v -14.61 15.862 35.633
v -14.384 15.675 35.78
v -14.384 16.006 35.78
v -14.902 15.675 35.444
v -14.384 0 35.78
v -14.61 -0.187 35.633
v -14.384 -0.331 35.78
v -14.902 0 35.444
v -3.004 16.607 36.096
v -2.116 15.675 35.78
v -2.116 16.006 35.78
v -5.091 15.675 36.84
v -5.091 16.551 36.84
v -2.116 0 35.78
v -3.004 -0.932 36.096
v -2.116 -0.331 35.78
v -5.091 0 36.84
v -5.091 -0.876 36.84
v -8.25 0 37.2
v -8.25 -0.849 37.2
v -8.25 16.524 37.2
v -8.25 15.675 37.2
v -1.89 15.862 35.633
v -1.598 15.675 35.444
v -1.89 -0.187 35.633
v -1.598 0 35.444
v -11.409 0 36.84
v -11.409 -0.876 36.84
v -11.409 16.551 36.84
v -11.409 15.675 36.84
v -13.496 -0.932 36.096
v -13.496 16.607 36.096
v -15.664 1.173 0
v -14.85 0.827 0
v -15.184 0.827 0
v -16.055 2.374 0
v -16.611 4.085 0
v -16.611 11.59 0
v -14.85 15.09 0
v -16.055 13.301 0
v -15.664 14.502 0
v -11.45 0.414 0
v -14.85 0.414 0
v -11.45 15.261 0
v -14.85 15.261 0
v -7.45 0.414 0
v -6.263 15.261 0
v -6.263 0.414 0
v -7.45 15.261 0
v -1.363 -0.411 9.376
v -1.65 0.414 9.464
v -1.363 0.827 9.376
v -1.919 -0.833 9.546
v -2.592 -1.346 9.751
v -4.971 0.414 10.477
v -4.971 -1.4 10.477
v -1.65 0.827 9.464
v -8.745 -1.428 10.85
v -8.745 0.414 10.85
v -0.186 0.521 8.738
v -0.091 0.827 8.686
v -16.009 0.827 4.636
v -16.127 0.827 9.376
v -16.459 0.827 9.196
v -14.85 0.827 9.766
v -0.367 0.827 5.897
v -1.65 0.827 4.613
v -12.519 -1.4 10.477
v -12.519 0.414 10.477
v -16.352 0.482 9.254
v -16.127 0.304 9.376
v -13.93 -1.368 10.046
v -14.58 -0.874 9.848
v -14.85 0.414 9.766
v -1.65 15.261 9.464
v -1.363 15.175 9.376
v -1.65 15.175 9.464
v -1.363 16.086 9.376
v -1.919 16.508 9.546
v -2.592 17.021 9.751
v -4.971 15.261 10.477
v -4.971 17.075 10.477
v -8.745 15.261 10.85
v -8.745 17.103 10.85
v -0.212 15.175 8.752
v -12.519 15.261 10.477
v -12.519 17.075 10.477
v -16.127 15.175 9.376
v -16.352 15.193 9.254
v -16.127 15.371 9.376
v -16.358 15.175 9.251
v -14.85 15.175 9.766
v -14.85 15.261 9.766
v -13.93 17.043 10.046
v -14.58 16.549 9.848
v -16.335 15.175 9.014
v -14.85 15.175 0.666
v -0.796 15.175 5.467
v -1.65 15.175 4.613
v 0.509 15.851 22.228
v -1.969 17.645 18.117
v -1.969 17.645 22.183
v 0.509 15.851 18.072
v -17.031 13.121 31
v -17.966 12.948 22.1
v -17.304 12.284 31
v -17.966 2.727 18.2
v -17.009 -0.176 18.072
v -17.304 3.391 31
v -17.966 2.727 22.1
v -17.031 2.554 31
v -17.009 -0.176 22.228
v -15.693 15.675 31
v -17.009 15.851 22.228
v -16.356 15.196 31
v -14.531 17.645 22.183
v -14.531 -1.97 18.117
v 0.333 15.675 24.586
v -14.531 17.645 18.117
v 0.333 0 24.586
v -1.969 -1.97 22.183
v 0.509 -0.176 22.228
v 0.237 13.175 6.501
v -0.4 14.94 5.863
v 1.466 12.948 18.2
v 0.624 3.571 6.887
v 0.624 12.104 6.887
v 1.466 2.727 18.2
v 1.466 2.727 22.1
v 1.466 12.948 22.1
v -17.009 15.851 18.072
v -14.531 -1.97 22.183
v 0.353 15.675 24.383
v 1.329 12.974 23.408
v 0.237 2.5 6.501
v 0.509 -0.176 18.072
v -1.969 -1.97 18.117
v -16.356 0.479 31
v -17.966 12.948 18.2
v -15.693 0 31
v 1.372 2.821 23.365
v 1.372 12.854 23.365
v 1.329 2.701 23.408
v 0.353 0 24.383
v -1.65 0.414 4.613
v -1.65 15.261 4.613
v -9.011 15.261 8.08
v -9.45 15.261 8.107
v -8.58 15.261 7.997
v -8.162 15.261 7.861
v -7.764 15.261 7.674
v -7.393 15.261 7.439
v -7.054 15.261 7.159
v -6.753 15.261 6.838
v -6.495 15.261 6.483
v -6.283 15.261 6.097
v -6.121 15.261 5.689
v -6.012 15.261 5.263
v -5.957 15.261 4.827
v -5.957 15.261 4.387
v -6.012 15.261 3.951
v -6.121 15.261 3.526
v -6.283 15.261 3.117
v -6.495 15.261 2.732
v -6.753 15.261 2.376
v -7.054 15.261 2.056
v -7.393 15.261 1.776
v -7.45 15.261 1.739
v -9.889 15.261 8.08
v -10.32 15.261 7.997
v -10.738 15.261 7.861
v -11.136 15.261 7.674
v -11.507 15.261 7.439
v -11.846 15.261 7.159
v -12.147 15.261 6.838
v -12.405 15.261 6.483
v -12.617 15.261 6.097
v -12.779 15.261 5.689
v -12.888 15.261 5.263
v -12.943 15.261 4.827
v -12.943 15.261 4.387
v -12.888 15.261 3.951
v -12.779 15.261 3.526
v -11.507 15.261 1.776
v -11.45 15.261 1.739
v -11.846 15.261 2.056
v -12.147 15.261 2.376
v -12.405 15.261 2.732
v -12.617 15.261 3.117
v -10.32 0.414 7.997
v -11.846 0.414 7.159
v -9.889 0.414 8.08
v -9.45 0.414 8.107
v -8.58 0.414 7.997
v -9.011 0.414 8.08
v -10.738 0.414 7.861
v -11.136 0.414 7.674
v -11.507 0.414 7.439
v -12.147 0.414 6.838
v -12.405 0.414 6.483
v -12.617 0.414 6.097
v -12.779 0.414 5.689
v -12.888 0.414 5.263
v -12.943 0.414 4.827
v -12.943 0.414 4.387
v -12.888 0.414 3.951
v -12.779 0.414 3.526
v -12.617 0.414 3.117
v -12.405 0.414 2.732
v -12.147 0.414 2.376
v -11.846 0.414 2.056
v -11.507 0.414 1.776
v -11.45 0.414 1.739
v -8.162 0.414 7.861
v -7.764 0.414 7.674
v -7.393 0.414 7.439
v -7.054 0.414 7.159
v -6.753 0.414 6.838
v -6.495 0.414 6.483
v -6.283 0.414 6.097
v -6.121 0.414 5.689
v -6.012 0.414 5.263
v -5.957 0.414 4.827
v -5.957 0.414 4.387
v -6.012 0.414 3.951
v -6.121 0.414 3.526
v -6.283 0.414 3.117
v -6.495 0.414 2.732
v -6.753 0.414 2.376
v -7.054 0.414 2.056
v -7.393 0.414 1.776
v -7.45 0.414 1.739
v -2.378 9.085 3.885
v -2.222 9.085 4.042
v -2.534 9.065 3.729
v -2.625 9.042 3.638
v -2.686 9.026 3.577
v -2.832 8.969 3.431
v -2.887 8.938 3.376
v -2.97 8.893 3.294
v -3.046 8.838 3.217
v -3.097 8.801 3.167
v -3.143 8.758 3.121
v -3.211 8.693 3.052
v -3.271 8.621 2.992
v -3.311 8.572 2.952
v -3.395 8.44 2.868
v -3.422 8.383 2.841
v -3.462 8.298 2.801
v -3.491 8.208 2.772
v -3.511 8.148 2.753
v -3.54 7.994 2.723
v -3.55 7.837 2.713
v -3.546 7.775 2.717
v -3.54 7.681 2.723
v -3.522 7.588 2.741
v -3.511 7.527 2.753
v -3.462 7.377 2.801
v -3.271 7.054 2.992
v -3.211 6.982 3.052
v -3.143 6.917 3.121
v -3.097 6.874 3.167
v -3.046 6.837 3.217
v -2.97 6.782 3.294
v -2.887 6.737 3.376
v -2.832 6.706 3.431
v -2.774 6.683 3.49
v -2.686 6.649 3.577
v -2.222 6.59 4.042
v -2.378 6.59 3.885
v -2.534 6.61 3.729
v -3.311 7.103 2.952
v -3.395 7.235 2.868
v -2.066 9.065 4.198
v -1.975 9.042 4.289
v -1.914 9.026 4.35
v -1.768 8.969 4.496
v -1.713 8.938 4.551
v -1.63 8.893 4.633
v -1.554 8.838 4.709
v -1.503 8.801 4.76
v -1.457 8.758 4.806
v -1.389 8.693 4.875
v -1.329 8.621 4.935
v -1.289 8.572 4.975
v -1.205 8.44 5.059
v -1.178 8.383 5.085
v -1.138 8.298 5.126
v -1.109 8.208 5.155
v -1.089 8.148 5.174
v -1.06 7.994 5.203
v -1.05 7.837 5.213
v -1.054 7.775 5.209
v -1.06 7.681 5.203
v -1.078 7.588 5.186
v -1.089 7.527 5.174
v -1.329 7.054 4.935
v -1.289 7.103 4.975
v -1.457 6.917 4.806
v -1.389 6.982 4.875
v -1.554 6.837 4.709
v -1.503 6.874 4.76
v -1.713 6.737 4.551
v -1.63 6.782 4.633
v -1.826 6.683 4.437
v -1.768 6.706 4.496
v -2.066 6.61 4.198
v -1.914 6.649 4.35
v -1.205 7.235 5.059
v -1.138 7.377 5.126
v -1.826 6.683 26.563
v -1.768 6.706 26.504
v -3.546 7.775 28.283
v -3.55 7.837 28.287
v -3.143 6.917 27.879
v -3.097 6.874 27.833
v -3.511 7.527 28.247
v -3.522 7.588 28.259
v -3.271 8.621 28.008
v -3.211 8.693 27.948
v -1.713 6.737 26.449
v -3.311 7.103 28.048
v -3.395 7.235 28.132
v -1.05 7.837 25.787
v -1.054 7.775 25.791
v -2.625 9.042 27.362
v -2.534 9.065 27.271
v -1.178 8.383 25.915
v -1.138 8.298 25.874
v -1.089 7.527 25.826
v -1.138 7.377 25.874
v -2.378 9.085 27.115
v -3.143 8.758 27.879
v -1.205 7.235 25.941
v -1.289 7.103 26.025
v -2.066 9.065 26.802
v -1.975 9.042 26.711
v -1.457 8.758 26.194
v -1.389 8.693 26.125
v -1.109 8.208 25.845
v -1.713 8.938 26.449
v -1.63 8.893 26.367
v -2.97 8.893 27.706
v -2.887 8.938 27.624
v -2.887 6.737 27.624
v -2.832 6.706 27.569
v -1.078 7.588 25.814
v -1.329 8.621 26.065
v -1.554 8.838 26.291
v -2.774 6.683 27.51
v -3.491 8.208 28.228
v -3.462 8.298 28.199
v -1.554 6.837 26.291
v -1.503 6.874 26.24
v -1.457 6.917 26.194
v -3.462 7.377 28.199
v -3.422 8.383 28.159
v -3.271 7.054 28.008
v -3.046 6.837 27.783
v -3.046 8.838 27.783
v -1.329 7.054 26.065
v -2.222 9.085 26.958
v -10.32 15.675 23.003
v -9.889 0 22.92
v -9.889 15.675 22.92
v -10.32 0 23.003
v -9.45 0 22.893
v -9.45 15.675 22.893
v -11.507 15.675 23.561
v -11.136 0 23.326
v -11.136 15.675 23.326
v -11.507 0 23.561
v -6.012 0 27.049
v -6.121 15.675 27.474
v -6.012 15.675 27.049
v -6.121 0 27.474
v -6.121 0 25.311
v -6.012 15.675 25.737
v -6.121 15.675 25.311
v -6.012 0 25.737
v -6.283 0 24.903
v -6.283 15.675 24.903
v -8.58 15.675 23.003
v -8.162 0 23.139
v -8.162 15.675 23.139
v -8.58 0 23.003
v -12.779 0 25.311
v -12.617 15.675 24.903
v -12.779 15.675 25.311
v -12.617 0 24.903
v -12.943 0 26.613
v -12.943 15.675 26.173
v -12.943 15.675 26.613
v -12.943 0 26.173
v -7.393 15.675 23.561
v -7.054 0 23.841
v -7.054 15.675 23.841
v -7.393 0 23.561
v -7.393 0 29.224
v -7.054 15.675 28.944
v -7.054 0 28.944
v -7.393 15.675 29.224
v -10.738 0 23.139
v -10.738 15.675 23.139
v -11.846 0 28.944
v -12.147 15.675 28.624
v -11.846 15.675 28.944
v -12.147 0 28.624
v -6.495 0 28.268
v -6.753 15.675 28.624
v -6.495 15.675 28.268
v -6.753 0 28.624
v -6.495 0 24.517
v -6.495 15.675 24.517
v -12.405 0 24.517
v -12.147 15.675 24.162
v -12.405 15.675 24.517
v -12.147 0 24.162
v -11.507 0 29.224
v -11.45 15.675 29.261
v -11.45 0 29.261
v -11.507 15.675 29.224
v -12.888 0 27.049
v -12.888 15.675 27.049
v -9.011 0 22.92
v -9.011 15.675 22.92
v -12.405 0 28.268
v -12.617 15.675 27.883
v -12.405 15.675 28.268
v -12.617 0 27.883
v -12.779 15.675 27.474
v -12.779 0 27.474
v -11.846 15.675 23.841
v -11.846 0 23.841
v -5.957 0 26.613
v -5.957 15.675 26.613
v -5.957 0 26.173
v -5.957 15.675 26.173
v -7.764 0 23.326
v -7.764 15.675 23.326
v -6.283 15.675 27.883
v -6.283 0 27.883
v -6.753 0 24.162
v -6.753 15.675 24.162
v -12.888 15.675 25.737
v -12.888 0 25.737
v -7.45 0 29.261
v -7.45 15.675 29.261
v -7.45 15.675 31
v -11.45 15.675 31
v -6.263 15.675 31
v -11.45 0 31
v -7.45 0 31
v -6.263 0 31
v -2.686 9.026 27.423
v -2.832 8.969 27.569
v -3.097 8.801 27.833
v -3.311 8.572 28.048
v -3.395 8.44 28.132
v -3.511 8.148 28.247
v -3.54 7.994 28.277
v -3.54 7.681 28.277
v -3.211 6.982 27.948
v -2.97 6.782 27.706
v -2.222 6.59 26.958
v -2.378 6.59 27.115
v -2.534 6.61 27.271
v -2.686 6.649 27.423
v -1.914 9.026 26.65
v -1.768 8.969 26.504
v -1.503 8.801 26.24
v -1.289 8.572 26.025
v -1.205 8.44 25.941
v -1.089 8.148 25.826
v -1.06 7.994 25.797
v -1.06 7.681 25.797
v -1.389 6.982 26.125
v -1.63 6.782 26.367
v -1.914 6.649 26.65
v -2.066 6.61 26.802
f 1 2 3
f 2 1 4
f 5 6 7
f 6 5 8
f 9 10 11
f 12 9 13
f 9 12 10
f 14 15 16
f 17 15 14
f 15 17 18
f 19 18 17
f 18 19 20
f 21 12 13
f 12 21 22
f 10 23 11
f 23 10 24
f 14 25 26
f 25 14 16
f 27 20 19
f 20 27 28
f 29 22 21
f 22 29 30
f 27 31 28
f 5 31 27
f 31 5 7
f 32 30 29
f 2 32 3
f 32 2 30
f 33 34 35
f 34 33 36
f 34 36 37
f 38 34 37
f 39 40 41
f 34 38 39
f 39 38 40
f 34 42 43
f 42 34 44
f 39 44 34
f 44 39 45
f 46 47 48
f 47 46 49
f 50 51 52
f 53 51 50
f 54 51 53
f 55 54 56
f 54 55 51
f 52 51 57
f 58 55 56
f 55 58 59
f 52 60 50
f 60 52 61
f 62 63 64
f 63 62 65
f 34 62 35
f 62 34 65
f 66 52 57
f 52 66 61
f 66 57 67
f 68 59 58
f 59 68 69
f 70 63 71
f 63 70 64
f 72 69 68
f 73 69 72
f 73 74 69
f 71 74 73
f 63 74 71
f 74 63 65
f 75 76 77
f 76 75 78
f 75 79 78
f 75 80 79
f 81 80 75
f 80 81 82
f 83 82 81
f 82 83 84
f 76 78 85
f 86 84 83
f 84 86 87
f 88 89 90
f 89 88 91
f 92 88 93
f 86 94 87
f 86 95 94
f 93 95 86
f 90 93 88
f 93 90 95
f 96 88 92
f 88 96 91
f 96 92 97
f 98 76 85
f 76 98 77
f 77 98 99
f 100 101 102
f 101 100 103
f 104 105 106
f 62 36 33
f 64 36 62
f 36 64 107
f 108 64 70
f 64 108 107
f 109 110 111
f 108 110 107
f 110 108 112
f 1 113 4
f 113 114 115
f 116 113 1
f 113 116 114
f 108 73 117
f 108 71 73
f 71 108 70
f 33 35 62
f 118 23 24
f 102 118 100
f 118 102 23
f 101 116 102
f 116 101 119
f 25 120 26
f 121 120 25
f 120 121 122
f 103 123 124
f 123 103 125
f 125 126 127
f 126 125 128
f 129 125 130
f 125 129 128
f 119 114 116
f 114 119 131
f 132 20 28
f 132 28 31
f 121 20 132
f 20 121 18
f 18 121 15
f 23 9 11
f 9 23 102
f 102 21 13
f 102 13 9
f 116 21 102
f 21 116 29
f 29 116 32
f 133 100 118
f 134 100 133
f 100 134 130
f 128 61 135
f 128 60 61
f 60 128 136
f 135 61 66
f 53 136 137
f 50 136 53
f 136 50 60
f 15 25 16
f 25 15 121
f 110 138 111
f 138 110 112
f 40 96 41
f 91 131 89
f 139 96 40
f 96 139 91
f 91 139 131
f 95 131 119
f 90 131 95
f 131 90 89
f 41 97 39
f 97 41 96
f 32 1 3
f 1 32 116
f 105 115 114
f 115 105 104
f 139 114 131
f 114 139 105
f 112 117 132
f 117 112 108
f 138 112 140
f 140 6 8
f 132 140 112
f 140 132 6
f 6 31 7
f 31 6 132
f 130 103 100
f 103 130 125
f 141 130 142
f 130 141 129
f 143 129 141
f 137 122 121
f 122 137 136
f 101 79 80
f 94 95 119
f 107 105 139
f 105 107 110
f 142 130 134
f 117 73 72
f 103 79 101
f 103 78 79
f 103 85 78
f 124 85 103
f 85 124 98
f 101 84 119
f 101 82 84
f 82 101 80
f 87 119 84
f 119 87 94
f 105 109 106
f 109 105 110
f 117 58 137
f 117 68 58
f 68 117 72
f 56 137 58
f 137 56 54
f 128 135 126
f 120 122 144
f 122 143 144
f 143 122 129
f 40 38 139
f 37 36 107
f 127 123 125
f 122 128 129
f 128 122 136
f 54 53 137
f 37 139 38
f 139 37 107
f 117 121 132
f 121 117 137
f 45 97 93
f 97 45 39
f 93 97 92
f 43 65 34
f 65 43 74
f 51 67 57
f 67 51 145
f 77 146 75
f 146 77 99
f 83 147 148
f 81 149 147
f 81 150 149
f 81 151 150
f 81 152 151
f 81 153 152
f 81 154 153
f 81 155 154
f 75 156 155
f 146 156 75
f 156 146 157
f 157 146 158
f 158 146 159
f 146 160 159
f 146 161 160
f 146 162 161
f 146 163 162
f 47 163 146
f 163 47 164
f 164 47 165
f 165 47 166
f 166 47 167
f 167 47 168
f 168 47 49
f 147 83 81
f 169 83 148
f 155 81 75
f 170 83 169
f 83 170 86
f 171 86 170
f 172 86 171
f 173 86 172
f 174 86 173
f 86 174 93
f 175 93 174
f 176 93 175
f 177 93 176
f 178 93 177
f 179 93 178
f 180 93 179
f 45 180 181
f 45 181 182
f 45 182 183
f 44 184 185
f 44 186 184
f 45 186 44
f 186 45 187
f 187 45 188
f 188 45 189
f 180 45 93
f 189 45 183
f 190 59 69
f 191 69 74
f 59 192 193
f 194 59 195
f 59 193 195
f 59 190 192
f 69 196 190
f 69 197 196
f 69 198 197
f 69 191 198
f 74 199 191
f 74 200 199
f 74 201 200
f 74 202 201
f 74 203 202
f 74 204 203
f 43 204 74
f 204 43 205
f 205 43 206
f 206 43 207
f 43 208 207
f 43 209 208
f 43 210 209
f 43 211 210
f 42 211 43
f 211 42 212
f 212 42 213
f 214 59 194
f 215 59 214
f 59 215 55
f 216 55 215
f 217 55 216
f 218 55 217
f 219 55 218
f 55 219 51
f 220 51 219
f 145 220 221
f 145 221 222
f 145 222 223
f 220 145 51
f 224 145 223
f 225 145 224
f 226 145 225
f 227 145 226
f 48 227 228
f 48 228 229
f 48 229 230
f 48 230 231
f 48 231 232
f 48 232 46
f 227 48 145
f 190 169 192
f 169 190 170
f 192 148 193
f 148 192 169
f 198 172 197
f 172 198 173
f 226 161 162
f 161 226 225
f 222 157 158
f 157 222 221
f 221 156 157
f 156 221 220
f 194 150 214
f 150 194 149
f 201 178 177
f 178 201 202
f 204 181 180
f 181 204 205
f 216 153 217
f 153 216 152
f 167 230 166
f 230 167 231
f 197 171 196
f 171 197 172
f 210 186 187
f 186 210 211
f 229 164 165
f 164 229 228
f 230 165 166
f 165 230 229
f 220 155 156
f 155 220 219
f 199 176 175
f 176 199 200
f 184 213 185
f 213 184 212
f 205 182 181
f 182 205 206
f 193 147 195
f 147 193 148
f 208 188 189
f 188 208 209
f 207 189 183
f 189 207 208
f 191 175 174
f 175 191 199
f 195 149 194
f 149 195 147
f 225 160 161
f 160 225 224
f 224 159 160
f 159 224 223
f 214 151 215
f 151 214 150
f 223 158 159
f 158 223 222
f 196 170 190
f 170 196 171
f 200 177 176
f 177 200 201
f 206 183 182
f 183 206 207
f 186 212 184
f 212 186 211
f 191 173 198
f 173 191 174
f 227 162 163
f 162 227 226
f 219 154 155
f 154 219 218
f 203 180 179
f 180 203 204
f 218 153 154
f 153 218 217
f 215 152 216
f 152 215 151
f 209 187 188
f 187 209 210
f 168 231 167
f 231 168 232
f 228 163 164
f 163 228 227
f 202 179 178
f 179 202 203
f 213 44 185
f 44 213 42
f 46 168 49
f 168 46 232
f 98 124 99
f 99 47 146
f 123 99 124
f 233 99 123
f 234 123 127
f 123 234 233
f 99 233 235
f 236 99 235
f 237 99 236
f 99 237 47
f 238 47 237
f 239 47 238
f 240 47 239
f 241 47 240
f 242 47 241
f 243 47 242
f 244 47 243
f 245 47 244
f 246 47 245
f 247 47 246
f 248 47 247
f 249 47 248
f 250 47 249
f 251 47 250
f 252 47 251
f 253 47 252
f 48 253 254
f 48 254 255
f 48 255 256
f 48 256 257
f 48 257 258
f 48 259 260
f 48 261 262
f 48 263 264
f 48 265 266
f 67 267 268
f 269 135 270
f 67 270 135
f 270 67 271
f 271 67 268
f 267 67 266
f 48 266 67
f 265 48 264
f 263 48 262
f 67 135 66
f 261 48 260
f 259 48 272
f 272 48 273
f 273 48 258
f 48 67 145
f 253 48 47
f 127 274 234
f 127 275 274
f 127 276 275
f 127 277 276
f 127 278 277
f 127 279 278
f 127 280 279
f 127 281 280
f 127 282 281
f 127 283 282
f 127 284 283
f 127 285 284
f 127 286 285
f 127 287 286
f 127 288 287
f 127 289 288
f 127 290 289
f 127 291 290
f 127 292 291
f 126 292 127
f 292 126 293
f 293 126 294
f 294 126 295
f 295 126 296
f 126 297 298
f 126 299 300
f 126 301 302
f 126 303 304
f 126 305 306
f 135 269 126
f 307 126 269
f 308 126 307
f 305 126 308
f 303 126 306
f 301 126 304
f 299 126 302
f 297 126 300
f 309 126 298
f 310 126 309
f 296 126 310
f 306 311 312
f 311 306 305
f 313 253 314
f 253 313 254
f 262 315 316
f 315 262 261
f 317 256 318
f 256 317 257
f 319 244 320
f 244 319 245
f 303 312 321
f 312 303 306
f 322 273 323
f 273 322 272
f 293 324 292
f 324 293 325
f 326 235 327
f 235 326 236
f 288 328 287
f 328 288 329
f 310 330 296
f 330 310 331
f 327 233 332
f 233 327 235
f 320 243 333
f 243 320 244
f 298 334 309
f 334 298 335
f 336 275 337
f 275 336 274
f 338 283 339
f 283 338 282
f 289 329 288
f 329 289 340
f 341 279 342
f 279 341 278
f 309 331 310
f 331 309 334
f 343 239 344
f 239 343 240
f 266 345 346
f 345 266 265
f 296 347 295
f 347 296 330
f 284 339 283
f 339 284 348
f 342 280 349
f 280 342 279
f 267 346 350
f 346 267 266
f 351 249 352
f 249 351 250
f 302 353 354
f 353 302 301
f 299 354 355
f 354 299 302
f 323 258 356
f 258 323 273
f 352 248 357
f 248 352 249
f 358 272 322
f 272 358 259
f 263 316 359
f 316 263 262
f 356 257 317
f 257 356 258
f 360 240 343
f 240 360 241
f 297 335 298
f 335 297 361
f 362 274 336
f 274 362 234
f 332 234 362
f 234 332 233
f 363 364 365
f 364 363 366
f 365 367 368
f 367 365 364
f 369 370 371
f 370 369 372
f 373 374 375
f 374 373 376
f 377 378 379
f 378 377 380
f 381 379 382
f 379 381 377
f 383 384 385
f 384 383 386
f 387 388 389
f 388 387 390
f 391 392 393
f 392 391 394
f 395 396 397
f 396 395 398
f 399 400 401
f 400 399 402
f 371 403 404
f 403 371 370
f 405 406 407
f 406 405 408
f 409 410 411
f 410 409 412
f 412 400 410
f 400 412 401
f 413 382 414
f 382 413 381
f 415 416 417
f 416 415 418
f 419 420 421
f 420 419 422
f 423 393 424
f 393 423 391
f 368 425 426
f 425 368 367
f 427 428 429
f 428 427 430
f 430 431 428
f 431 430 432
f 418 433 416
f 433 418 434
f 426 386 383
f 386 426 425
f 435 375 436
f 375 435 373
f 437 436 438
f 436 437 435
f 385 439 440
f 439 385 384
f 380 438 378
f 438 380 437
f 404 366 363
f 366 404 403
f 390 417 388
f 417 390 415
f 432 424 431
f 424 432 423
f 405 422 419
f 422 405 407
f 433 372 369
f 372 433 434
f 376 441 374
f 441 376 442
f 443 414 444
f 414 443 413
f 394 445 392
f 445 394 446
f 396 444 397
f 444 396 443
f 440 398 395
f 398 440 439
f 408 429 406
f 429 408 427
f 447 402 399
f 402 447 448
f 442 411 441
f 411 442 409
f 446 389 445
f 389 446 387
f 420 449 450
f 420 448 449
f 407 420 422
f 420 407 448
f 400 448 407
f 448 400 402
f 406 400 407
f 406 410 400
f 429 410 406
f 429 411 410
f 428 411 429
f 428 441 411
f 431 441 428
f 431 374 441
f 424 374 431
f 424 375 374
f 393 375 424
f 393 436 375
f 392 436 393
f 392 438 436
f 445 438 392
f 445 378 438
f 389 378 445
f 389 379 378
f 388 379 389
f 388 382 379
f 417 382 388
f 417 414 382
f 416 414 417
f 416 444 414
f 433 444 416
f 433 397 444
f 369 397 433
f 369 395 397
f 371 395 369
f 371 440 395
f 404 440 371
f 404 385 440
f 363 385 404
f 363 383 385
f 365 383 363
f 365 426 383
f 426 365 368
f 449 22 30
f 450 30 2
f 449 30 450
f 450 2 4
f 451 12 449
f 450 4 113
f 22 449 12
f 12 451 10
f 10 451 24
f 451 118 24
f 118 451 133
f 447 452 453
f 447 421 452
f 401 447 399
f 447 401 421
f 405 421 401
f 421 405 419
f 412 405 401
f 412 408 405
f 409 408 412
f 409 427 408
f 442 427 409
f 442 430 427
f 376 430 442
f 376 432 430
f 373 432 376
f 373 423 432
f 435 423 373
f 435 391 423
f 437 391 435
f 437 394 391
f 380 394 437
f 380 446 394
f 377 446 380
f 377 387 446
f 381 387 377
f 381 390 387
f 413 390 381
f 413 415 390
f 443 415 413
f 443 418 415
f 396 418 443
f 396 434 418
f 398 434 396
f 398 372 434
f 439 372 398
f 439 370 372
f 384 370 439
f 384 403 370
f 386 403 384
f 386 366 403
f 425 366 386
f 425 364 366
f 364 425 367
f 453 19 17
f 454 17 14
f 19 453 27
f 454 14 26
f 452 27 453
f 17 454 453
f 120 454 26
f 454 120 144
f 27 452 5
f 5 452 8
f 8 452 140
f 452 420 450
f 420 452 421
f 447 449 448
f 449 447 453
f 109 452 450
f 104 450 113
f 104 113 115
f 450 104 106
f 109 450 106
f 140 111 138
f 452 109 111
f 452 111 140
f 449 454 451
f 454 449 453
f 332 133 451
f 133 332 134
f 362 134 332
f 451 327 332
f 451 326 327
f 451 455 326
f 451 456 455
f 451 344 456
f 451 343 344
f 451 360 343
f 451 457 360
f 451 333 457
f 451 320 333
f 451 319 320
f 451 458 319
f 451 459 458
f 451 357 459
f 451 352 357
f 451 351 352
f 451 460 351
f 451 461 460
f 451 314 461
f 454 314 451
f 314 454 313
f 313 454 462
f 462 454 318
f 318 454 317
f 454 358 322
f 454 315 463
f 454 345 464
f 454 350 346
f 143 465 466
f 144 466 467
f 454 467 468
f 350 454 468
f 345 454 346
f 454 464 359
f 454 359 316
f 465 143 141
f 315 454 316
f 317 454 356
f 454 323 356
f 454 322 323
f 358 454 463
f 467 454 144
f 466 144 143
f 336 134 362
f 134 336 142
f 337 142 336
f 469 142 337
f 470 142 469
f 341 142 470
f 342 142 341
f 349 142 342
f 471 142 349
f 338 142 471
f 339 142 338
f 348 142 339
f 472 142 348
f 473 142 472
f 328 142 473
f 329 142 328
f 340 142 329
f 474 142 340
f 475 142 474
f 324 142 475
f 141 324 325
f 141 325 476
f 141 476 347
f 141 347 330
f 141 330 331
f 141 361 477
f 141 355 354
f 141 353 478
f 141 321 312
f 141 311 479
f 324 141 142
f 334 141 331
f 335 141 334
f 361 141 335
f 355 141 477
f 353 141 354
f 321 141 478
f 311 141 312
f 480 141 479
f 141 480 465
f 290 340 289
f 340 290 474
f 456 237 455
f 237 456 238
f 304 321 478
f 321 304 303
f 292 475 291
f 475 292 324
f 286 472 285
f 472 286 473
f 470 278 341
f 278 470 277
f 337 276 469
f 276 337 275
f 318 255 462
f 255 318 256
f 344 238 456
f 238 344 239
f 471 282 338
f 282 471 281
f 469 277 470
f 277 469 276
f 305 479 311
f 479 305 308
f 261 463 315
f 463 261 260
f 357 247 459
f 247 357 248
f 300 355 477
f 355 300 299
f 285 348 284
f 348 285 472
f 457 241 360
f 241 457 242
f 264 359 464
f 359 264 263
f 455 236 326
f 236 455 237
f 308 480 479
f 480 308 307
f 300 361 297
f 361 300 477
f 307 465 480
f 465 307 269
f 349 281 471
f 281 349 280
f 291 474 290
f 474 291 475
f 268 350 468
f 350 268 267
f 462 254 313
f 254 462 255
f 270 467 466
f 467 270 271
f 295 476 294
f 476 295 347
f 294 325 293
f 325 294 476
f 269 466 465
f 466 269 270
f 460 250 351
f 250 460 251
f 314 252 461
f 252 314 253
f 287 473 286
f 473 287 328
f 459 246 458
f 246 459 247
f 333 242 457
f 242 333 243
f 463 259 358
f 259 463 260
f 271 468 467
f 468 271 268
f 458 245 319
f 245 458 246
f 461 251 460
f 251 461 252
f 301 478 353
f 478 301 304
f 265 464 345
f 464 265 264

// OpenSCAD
// file: util/finger_base.scad
include <../../config.scad>

rotate([0,-90,0]) fingerbase();

//	Base segment of finger, can be lengthened
module fingerbase(length=20, proximalHole=true, distalHole=true)
{
	difference() {
		scale([yScaleFactor,xScaleFactor,zScaleFactor]) {
			fingerbasesolid(length);
		}
		if(proximalHole) {
			translate([0,knucklePadding/2 * xScaleFactor,0]) fingerhardwarecutouts(jointDia, jointThick, knuckleW=knuckleW-knucklePadding, fingerLen=length);
		}
		if (distalHole) {
			translate([length * yScaleFactor,0,0]) mirror([1,0,0]) fingerhardwarecutouts(jointDia, jointThick, knuckleW=knuckleW, fingerLen=length);
		}
	}


	
}

module fingerhardwarecutouts(jointDia,jointThick,knuckleW,fingerLen,holeCutoff=100) {
	//slot for flex joint
	translate([7 - (15/jointDia),0,6*zScaleFactor - (1.8/jointThick)]) {
		rotate([90,0,0]) translate([-0.25,0,-knuckleW*xScaleFactor]) cylinder(d=jointDia, h=knuckleW*xScaleFactor, $fn=50);
		translate([-25,(knuckleW*xScaleFactor) / 2,0]) cube([50,knuckleW*xScaleFactor,jointThick], center=true);
	}
	//cubic parts
	translate([-100,0,0]) cube([100,knuckleW*xScaleFactor,100]);
	translate([-13/zScaleFactor,0,0]) rotate([0,45,0]) translate([-50,0,0]) cube([100,knuckleW * xScaleFactor, 10]);

	//channel for string/tendon
	translate([-fingerLen/2 * yScaleFactor, knuckleW/2 * xScaleFactor, 2.3]) rotate([0,90,0]) cylinder(d=2.5, h=holeCutoff, $fn=50);
}

//	base segment of finger, solid
module fingerbasesolid(length=50, cutout=true) {
	difference() {
		//cubic part
		translate([0,0.001 + knucklePadding/2,1]) cube([length, knuckleW - knucklePadding - 0.002, 8]);
	}
	
	//cylindrical-ish part around finger
	intersection() {
		//overly large shape to get the cross section in the XZ plane from
		difference() {
			union() {
				translate([length-4,-5,5]) rotate([-90,0,0]) cylinder(r=8,h=knuckleW + 10);
				translate([0,-5,-5]) cube([length,knuckleW + 10,20]);
			}
			//cutout for the side "guards" of the previous knuckle
			if(cutout) {
				translate([-4,-knuckleW+0.001,5.3]) rotate([-90,0,0]) cylinder(r=11,h=10);
				translate([-4,knuckleW - knucklePadding*(1/xScaleFactor),5.3]) rotate([-90,0,0]) cylinder(r=11,h=10);
			}
		}

		hull() {
			for(i=[-1,1], j=[-1,1]) {
				//angled cylinders to provide the outer shape of the finger
				translate([length/10,i*2.4 + knuckleW/2,j*2.2 + 5]) rotate([i*j*-4,j*86,0]) cylinder(d=6,h=20,center=true);
				translate([length+4, i*2.4 + knuckleW/2, j*2.2 + 5]) rotate([i*j*-4,j*-86,0]) cylinder(d=6,h=20,center=true);
			}
		}
	}
}
// file: ../config.scad
/**
 * Configuration settings for Flexy Beast, required to generate correctly sized STLs of the printed parts. See the Configuration File Assembly instructions to set this up.
 * @id config_file
 * @name Configuration File
 * @category Prerequisites!
 * @step Open config.scad in your favorite text editor.
 * @step As per the normal Cyborg Beast instructions, measure the width of the knuckles in the non-affected hand and convert to millimeters.
 * @step Add 5 to that result and then divide by 55.
 * @step Replace the x-, y-, and zScaleFactor variables in config.scad with that number.
 * @step If desired, adjust the proportions of the hand by changing those variables individually. xScaleFactor controls the width of the hand, yScaleFactor controls the length, and zScaleFactor controls the height.
 * @step Open assembly.scad in OpenSCAD to check that the flexy joint holes are not too large for the hand (should only be necessary for small children). If necessary, reduce the jointDia and jointThick variables. jointDia=5 and jointThick=2 is a good amount for smaller hands.
 * @step Set the fingerPads variable to true or false depending on whether you want to cast silicone finger pads for improved grip.
 * @step Open palm.scad, finger_base.scad, finger_tip.scad, and thumb_tip.scad in OpenSCAD, render each part (F6), and export as STL, then print. Suggested print settings are 0.2mm or smaller layer height, 3 perimeters, and 25% rectilinear or hexagonal infill.
 */

knuckleR = 4.85;
knucklePadding = 0.5;
knuckleW = 9.5;
wristH = 10;
palmH = 20;
palmW = 64;
th = 3;
fn = 32;

//flexy joint parameters
jointDia = 7;
jointThick = 4;

//finger settings
fingerPads = true; //whether or not to hollow the finger tips slightly for molding pads
fingerLength = 1; //multiply the length of all fingers by this amount
thumbProp = 0.8; //proportion of thumb length relative to other fingers (note that the thumb is a segment shorter than the other fingers already)
indexProp = 0.8; //proportion of index finger length relative to other fingers
middleProp = 1; //proportion of middle finger length relative to other fingers
ringProp = 0.8; //proportion of ring finger length relative to other fingers
pinkyProp = 0.7; //proportion of pinky finger length relative to other fingers

//misc settings
thermoform = true; //whether or not to generate a thermoformable mesh for the palm

//desired scale factor for hand based on the standard Cyborg Beast/Robohand sizing guide
xScaleFactor = 1.65; // [1.05:1.60]
yScaleFactor = 1.55; // [1.05:1.60]
zScaleFactor = 1.65; // [1.05:1.60]
// main file
include <../config.scad>
use <util/finger_base.scad>

rotate([0,-90,0]) fingerbase(length = 20 * middleProp * fingerLength);

/**
 * Proximal phalanx for middle finger - rendered from parts/finger_middle_base.scad
 * @id middle_base
 * @name Middle Finger Base
 * @category Printed
 */
